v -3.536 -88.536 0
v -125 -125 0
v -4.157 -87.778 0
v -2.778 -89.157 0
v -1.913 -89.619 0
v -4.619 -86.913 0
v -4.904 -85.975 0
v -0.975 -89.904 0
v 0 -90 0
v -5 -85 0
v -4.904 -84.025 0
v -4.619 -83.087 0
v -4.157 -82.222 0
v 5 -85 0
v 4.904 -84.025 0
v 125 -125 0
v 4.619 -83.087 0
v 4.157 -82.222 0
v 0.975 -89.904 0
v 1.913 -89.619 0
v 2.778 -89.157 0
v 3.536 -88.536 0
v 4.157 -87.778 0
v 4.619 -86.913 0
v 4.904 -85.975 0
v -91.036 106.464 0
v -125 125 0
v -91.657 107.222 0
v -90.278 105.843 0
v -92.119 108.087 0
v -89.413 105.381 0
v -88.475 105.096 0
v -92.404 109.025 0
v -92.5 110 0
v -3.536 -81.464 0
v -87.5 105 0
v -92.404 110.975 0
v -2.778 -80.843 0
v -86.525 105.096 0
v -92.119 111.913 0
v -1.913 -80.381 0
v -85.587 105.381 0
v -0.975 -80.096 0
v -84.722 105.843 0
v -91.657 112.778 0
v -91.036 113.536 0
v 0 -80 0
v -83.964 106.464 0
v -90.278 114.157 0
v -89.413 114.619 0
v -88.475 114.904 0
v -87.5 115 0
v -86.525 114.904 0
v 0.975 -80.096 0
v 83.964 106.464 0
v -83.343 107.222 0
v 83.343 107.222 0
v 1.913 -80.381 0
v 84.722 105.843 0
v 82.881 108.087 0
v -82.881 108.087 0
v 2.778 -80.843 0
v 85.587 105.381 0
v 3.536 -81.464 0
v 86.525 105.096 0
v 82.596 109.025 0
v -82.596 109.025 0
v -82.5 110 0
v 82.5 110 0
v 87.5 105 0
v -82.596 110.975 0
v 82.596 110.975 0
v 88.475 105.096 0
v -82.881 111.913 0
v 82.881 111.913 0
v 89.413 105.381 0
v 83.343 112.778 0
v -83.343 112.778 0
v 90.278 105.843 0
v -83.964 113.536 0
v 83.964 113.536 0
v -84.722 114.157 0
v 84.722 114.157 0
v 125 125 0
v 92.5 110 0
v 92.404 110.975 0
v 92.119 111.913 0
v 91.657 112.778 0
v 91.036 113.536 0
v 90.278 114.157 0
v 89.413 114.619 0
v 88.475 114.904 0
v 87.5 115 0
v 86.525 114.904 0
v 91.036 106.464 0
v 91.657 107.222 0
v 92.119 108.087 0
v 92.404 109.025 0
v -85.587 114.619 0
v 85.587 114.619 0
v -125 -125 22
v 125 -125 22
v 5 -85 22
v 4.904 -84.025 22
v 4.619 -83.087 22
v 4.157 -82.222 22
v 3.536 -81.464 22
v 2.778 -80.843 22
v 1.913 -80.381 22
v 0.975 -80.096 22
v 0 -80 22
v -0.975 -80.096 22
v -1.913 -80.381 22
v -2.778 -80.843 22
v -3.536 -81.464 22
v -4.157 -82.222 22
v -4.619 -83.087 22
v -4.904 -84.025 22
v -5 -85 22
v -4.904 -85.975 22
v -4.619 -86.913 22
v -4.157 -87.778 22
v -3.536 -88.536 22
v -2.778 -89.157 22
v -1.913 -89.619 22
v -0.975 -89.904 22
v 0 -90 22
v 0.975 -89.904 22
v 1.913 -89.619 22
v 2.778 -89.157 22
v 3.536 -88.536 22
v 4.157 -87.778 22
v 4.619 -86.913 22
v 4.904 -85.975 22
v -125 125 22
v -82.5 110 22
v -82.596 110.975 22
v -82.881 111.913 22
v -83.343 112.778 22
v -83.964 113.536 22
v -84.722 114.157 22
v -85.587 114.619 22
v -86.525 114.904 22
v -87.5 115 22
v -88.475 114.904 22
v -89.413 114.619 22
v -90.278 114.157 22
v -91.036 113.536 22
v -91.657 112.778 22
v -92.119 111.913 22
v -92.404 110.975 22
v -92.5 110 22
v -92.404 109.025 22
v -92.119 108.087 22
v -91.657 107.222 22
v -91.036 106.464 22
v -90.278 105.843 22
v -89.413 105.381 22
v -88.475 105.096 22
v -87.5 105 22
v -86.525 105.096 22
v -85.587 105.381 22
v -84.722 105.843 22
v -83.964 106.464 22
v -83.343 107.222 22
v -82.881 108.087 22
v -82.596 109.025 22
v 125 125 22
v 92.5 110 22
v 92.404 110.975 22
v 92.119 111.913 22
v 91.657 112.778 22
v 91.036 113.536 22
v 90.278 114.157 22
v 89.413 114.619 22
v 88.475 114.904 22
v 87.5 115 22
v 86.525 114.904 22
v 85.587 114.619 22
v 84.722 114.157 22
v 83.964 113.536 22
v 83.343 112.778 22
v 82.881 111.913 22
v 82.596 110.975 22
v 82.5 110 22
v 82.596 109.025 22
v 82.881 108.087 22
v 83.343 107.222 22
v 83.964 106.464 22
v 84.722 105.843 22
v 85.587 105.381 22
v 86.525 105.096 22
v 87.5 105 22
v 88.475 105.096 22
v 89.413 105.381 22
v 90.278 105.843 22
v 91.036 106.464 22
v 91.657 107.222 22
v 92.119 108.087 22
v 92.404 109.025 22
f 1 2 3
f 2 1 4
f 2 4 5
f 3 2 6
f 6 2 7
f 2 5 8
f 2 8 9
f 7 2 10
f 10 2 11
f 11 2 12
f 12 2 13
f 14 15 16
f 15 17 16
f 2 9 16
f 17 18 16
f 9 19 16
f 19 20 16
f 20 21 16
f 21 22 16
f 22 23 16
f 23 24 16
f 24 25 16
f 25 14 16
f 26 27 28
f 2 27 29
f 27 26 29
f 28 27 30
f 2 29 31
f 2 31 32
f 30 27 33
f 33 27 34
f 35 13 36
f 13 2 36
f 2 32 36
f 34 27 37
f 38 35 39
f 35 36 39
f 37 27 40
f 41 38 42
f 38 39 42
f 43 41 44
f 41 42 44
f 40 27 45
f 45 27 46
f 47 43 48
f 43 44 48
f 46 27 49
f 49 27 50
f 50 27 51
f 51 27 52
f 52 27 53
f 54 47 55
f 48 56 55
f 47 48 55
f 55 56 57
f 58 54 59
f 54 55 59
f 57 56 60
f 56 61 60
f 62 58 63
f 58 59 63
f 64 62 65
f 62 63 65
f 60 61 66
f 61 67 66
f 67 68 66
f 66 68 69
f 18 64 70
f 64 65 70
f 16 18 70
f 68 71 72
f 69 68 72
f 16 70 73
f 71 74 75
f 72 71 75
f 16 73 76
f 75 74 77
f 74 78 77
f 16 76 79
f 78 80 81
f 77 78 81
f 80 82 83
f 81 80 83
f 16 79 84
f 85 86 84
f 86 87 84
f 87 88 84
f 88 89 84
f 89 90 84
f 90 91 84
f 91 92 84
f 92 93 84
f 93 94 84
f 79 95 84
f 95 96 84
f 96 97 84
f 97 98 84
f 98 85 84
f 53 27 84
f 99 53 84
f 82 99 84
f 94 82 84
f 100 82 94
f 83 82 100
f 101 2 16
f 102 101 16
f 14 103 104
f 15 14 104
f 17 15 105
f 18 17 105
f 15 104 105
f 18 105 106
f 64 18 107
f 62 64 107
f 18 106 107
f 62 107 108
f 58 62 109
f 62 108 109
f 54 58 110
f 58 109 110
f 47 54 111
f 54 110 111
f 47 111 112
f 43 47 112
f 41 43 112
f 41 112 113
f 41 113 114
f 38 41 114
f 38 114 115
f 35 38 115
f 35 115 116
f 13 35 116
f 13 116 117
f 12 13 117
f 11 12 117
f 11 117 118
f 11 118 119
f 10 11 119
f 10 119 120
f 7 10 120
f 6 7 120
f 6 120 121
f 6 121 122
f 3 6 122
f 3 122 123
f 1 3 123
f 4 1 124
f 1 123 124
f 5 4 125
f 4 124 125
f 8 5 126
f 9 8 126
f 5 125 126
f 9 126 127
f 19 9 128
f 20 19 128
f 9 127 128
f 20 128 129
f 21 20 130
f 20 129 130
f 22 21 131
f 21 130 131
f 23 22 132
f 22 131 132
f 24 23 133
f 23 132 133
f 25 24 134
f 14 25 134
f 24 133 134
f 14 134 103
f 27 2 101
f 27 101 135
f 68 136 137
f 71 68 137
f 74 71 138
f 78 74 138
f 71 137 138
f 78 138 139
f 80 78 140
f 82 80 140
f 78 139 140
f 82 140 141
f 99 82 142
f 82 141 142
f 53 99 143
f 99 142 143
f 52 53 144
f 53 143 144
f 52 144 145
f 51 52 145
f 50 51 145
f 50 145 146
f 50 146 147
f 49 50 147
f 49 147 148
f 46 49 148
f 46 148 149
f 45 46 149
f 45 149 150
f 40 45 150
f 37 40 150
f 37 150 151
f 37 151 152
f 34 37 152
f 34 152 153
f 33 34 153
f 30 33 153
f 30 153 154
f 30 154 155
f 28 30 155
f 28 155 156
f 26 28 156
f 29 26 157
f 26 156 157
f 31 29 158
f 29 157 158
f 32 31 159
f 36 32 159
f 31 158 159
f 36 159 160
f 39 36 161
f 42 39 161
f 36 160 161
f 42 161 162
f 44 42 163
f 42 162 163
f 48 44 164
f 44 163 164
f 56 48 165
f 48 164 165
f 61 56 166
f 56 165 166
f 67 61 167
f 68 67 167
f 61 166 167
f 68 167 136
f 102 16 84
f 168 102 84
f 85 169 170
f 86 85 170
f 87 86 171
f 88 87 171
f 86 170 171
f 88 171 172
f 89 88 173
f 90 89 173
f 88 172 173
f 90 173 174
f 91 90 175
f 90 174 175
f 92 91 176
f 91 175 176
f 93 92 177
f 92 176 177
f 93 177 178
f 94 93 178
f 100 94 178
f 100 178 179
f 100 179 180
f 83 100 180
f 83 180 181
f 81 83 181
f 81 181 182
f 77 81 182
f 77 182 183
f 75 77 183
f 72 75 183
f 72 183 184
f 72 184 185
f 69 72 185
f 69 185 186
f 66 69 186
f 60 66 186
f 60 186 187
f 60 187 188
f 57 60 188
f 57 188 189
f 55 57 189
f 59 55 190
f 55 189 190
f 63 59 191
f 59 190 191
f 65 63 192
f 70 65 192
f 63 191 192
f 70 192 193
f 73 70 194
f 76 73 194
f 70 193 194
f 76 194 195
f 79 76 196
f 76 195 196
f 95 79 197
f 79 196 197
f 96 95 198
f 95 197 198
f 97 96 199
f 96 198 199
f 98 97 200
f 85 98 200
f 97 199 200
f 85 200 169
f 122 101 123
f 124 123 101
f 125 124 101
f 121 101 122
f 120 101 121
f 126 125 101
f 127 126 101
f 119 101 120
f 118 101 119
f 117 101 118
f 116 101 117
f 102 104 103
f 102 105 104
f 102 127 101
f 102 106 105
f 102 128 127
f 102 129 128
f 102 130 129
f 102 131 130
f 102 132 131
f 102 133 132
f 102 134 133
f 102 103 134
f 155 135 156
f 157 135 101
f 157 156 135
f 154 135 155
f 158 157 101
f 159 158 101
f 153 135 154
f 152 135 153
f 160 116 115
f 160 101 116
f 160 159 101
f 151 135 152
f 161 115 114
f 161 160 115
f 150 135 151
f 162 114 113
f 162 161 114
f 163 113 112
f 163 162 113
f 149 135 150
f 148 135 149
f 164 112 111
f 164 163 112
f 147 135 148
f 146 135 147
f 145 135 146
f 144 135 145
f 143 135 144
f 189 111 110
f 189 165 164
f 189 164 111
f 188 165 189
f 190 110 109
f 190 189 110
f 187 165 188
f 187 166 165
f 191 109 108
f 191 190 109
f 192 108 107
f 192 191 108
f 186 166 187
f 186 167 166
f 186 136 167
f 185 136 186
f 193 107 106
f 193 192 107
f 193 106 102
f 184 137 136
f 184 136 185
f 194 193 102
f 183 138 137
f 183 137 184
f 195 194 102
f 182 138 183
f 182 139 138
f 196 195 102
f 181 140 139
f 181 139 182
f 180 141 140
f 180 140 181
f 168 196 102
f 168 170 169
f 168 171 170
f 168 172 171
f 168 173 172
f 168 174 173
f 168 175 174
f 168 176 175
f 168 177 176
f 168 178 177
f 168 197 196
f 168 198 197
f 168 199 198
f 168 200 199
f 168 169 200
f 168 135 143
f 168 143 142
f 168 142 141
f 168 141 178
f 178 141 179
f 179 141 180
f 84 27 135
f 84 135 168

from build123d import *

# Parameters (mm, degrees)
ESQUISSE1_W          = 250
ESQUISSE1_H          = 250
BOSS_EXTRU_1_DEPTH   = 22
D_GAGEMENT_M81_D     = 10
D_GAGEMENT_M81_DEPTH = 208
D_GAGEMENT_M81_TIP   = 3.004303095


with BuildPart() as part:
    # Esquisse1 → Boss.-Extru.1 (new body)
    with BuildSketch(Plane.XY):
        Rectangle(ESQUISSE1_W, ESQUISSE1_H)
    extrude(amount=BOSS_EXTRU_1_DEPTH)

    # Dégagement M81
    with Locations(Plane(origin=(0, 110, -30), x_dir=(-1, 0, 0), z_dir=(0, 0, -1))):
        with Locations((-87.5, 0), (87.5, 0), (0, -195)):
            Hole(D_GAGEMENT_M81_D / 2, depth=D_GAGEMENT_M81_DEPTH)
            with Locations((0, 0, -(D_GAGEMENT_M81_DEPTH + D_GAGEMENT_M81_TIP / 2))):  # 118° drill point
                Cone(0, D_GAGEMENT_M81_D / 2, D_GAGEMENT_M81_TIP, mode=Mode.SUBTRACT)


solid = part.part
